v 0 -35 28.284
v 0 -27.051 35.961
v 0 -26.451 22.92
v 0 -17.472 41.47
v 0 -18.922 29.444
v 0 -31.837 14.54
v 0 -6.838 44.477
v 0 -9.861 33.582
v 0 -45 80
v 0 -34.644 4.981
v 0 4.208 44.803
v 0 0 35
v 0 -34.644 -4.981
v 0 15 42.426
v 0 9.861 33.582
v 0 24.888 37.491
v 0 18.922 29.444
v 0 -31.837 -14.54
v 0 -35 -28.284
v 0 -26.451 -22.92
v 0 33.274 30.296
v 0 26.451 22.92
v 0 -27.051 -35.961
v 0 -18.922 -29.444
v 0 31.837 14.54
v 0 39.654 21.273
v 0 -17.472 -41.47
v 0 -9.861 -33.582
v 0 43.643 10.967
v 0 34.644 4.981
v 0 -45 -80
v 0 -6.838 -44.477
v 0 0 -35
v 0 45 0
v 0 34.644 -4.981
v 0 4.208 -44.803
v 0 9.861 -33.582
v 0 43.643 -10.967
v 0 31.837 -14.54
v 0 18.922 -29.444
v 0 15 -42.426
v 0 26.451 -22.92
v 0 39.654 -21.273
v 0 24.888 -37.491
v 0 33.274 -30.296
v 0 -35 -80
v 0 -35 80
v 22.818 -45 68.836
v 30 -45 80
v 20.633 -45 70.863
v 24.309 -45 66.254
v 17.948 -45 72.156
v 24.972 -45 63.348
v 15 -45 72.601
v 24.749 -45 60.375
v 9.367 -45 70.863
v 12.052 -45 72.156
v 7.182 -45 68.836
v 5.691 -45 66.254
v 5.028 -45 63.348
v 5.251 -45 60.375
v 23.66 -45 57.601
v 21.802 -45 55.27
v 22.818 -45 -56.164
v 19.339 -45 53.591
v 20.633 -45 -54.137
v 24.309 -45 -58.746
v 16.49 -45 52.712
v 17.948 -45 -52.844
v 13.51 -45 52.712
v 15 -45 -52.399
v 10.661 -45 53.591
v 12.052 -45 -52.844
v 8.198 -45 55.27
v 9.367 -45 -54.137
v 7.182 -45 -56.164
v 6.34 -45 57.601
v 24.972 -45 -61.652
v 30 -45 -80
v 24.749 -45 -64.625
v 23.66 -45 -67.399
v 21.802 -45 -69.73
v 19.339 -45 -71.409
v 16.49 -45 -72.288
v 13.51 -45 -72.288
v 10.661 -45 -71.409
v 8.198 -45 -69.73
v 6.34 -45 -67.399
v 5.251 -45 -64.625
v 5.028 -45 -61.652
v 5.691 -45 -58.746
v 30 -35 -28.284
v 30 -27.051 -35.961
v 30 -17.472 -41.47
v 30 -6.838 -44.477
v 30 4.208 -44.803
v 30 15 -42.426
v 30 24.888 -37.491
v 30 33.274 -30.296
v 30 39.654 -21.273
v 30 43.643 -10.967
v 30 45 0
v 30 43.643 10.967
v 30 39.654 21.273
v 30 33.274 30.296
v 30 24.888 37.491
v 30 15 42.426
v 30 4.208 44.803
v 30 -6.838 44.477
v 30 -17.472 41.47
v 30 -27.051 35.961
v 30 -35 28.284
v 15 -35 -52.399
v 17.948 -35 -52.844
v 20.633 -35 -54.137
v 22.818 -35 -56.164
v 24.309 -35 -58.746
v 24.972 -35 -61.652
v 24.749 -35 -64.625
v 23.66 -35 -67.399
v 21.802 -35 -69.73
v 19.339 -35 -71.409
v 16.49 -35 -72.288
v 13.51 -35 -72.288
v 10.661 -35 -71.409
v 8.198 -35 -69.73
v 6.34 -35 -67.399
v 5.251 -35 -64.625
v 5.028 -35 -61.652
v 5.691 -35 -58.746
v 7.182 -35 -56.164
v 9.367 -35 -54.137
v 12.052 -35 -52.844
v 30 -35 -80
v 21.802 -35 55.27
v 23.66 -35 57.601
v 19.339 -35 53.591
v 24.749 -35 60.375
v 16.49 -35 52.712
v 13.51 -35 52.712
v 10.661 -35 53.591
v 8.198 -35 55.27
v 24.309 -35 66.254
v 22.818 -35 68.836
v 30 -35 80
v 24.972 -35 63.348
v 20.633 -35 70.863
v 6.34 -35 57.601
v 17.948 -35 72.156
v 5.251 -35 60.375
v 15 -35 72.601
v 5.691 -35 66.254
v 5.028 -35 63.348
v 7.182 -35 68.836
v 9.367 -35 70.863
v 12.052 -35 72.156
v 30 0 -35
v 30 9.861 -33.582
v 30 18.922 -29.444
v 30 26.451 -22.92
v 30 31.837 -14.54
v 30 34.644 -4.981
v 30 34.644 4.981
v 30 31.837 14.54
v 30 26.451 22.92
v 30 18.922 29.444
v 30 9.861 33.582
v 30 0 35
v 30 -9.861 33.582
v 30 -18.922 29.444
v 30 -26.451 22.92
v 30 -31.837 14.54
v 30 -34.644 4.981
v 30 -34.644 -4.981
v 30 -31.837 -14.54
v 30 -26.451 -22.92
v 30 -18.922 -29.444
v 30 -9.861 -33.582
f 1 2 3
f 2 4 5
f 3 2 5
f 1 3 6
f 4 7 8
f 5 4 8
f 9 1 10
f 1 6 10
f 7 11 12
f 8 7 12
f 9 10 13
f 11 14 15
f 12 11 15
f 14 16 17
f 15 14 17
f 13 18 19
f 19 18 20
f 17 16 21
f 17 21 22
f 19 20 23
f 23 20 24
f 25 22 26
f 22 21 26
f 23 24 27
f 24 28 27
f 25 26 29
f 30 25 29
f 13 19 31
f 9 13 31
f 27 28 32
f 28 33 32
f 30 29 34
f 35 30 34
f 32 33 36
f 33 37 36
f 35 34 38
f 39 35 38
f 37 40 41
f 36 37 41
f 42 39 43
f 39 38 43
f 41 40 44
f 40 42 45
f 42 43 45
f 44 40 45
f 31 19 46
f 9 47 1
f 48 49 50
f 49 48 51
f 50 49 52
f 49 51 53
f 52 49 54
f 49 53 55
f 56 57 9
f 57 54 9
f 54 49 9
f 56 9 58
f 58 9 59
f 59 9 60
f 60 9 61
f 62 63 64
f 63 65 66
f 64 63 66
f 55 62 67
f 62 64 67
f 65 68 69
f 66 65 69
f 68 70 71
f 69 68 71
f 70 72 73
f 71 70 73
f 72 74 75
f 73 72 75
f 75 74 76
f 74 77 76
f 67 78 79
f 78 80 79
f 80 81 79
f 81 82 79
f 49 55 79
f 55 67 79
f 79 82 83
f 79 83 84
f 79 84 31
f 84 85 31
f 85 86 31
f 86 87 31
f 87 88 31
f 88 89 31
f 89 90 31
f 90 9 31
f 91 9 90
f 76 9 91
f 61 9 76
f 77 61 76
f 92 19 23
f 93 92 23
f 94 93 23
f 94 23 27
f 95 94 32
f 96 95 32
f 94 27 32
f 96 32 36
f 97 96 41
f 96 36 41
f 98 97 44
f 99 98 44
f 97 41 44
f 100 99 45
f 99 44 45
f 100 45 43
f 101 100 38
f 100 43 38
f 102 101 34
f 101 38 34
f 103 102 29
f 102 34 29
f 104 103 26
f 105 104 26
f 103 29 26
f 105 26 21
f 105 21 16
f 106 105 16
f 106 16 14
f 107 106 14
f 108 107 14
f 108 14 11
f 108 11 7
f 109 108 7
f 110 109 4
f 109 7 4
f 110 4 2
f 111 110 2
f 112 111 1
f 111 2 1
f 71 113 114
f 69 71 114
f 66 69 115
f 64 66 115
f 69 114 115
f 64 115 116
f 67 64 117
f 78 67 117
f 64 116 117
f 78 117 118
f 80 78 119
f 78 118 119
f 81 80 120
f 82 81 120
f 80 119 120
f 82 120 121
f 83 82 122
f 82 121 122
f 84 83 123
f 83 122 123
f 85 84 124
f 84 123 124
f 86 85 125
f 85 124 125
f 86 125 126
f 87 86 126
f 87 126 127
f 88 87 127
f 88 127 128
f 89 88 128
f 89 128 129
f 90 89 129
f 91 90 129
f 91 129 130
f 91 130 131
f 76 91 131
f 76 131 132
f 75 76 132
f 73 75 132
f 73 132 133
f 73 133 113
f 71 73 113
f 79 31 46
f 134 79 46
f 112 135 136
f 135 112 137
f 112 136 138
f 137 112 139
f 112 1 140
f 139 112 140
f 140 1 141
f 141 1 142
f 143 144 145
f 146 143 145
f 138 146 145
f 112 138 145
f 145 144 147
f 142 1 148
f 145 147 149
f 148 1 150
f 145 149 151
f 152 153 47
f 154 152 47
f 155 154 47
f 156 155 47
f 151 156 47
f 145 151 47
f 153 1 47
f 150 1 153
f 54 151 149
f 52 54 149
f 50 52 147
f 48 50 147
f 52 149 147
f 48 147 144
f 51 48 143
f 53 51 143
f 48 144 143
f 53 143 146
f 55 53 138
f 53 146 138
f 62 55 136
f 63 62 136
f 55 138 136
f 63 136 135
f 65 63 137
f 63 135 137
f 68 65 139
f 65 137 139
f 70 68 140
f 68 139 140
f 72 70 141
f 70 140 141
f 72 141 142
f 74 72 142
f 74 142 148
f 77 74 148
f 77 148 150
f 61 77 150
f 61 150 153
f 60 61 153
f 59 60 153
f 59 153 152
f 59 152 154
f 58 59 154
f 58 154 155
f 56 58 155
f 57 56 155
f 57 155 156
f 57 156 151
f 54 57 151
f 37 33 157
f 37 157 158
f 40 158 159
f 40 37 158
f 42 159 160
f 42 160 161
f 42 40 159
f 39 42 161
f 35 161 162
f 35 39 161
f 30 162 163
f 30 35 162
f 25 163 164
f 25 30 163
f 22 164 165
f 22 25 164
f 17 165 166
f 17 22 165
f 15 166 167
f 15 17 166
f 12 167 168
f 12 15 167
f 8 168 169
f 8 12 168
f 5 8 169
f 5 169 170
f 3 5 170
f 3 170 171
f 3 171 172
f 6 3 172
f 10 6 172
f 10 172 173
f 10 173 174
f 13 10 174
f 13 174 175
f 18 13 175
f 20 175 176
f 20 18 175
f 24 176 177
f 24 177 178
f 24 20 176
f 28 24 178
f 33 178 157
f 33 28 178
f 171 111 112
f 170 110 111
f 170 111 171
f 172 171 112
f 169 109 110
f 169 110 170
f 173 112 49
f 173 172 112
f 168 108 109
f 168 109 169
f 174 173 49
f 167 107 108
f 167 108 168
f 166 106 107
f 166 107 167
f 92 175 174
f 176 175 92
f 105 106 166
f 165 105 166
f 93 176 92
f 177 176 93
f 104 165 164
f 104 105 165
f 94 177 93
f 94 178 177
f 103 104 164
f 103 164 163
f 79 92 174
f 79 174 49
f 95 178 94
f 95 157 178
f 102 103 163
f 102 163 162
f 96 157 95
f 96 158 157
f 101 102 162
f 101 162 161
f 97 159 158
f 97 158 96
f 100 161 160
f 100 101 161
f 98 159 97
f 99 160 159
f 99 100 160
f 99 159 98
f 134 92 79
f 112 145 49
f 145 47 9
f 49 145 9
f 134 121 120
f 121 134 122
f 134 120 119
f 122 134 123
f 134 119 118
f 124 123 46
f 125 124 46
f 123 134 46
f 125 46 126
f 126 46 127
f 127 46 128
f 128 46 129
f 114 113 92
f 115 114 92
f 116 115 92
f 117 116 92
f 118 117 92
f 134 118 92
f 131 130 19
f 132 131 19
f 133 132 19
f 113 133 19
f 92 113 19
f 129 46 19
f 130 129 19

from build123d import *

# Parameters (mm, degrees)
SKETCH1_R           = 35
BOSS_EXTRUDE1_DEPTH = 30
SKETCH2_R           = 10
CUT_EXTRUDE1_DEPTH  = 30


with BuildPart() as part:
    # Sketch1 → Boss-Extrude1 (new body)
    with BuildSketch(Plane(origin=(0, 0, 0), x_dir=(0, 0, -1), z_dir=(1, 0, 0))):
        with BuildLine():
            Line((0, -45), (80, -45))
            Line((80, -45), (80, -35))
            Line((80, -35), (28.284271247, -35))
            ThreePointArc((28.284271247, -35), (0, 45), (-28.284271247, -35))
            Line((-28.284271247, -35), (-80, -35))
            Line((-80, -35), (-80, -45))
            Line((-80, -45), (0, -45))
        make_face()
        Circle(SKETCH1_R, mode=Mode.SUBTRACT)
    extrude(amount=BOSS_EXTRUDE1_DEPTH)

    # Sketch2 → Cut-Extrude1 (cut)
    with BuildSketch(Plane(origin=(0, -35, 0), x_dir=(1, 0, 0), z_dir=(0, 1, 0))):
        with Locations(Location((15, 62.399384691, 0), (0, 0, 270))):
            Circle(SKETCH2_R)
        with Locations(Location((15, -62.600615309, 0), (0, 0, 270))):
            Circle(SKETCH2_R)
    extrude(amount=-CUT_EXTRUDE1_DEPTH, mode=Mode.SUBTRACT)


solid = part.part
